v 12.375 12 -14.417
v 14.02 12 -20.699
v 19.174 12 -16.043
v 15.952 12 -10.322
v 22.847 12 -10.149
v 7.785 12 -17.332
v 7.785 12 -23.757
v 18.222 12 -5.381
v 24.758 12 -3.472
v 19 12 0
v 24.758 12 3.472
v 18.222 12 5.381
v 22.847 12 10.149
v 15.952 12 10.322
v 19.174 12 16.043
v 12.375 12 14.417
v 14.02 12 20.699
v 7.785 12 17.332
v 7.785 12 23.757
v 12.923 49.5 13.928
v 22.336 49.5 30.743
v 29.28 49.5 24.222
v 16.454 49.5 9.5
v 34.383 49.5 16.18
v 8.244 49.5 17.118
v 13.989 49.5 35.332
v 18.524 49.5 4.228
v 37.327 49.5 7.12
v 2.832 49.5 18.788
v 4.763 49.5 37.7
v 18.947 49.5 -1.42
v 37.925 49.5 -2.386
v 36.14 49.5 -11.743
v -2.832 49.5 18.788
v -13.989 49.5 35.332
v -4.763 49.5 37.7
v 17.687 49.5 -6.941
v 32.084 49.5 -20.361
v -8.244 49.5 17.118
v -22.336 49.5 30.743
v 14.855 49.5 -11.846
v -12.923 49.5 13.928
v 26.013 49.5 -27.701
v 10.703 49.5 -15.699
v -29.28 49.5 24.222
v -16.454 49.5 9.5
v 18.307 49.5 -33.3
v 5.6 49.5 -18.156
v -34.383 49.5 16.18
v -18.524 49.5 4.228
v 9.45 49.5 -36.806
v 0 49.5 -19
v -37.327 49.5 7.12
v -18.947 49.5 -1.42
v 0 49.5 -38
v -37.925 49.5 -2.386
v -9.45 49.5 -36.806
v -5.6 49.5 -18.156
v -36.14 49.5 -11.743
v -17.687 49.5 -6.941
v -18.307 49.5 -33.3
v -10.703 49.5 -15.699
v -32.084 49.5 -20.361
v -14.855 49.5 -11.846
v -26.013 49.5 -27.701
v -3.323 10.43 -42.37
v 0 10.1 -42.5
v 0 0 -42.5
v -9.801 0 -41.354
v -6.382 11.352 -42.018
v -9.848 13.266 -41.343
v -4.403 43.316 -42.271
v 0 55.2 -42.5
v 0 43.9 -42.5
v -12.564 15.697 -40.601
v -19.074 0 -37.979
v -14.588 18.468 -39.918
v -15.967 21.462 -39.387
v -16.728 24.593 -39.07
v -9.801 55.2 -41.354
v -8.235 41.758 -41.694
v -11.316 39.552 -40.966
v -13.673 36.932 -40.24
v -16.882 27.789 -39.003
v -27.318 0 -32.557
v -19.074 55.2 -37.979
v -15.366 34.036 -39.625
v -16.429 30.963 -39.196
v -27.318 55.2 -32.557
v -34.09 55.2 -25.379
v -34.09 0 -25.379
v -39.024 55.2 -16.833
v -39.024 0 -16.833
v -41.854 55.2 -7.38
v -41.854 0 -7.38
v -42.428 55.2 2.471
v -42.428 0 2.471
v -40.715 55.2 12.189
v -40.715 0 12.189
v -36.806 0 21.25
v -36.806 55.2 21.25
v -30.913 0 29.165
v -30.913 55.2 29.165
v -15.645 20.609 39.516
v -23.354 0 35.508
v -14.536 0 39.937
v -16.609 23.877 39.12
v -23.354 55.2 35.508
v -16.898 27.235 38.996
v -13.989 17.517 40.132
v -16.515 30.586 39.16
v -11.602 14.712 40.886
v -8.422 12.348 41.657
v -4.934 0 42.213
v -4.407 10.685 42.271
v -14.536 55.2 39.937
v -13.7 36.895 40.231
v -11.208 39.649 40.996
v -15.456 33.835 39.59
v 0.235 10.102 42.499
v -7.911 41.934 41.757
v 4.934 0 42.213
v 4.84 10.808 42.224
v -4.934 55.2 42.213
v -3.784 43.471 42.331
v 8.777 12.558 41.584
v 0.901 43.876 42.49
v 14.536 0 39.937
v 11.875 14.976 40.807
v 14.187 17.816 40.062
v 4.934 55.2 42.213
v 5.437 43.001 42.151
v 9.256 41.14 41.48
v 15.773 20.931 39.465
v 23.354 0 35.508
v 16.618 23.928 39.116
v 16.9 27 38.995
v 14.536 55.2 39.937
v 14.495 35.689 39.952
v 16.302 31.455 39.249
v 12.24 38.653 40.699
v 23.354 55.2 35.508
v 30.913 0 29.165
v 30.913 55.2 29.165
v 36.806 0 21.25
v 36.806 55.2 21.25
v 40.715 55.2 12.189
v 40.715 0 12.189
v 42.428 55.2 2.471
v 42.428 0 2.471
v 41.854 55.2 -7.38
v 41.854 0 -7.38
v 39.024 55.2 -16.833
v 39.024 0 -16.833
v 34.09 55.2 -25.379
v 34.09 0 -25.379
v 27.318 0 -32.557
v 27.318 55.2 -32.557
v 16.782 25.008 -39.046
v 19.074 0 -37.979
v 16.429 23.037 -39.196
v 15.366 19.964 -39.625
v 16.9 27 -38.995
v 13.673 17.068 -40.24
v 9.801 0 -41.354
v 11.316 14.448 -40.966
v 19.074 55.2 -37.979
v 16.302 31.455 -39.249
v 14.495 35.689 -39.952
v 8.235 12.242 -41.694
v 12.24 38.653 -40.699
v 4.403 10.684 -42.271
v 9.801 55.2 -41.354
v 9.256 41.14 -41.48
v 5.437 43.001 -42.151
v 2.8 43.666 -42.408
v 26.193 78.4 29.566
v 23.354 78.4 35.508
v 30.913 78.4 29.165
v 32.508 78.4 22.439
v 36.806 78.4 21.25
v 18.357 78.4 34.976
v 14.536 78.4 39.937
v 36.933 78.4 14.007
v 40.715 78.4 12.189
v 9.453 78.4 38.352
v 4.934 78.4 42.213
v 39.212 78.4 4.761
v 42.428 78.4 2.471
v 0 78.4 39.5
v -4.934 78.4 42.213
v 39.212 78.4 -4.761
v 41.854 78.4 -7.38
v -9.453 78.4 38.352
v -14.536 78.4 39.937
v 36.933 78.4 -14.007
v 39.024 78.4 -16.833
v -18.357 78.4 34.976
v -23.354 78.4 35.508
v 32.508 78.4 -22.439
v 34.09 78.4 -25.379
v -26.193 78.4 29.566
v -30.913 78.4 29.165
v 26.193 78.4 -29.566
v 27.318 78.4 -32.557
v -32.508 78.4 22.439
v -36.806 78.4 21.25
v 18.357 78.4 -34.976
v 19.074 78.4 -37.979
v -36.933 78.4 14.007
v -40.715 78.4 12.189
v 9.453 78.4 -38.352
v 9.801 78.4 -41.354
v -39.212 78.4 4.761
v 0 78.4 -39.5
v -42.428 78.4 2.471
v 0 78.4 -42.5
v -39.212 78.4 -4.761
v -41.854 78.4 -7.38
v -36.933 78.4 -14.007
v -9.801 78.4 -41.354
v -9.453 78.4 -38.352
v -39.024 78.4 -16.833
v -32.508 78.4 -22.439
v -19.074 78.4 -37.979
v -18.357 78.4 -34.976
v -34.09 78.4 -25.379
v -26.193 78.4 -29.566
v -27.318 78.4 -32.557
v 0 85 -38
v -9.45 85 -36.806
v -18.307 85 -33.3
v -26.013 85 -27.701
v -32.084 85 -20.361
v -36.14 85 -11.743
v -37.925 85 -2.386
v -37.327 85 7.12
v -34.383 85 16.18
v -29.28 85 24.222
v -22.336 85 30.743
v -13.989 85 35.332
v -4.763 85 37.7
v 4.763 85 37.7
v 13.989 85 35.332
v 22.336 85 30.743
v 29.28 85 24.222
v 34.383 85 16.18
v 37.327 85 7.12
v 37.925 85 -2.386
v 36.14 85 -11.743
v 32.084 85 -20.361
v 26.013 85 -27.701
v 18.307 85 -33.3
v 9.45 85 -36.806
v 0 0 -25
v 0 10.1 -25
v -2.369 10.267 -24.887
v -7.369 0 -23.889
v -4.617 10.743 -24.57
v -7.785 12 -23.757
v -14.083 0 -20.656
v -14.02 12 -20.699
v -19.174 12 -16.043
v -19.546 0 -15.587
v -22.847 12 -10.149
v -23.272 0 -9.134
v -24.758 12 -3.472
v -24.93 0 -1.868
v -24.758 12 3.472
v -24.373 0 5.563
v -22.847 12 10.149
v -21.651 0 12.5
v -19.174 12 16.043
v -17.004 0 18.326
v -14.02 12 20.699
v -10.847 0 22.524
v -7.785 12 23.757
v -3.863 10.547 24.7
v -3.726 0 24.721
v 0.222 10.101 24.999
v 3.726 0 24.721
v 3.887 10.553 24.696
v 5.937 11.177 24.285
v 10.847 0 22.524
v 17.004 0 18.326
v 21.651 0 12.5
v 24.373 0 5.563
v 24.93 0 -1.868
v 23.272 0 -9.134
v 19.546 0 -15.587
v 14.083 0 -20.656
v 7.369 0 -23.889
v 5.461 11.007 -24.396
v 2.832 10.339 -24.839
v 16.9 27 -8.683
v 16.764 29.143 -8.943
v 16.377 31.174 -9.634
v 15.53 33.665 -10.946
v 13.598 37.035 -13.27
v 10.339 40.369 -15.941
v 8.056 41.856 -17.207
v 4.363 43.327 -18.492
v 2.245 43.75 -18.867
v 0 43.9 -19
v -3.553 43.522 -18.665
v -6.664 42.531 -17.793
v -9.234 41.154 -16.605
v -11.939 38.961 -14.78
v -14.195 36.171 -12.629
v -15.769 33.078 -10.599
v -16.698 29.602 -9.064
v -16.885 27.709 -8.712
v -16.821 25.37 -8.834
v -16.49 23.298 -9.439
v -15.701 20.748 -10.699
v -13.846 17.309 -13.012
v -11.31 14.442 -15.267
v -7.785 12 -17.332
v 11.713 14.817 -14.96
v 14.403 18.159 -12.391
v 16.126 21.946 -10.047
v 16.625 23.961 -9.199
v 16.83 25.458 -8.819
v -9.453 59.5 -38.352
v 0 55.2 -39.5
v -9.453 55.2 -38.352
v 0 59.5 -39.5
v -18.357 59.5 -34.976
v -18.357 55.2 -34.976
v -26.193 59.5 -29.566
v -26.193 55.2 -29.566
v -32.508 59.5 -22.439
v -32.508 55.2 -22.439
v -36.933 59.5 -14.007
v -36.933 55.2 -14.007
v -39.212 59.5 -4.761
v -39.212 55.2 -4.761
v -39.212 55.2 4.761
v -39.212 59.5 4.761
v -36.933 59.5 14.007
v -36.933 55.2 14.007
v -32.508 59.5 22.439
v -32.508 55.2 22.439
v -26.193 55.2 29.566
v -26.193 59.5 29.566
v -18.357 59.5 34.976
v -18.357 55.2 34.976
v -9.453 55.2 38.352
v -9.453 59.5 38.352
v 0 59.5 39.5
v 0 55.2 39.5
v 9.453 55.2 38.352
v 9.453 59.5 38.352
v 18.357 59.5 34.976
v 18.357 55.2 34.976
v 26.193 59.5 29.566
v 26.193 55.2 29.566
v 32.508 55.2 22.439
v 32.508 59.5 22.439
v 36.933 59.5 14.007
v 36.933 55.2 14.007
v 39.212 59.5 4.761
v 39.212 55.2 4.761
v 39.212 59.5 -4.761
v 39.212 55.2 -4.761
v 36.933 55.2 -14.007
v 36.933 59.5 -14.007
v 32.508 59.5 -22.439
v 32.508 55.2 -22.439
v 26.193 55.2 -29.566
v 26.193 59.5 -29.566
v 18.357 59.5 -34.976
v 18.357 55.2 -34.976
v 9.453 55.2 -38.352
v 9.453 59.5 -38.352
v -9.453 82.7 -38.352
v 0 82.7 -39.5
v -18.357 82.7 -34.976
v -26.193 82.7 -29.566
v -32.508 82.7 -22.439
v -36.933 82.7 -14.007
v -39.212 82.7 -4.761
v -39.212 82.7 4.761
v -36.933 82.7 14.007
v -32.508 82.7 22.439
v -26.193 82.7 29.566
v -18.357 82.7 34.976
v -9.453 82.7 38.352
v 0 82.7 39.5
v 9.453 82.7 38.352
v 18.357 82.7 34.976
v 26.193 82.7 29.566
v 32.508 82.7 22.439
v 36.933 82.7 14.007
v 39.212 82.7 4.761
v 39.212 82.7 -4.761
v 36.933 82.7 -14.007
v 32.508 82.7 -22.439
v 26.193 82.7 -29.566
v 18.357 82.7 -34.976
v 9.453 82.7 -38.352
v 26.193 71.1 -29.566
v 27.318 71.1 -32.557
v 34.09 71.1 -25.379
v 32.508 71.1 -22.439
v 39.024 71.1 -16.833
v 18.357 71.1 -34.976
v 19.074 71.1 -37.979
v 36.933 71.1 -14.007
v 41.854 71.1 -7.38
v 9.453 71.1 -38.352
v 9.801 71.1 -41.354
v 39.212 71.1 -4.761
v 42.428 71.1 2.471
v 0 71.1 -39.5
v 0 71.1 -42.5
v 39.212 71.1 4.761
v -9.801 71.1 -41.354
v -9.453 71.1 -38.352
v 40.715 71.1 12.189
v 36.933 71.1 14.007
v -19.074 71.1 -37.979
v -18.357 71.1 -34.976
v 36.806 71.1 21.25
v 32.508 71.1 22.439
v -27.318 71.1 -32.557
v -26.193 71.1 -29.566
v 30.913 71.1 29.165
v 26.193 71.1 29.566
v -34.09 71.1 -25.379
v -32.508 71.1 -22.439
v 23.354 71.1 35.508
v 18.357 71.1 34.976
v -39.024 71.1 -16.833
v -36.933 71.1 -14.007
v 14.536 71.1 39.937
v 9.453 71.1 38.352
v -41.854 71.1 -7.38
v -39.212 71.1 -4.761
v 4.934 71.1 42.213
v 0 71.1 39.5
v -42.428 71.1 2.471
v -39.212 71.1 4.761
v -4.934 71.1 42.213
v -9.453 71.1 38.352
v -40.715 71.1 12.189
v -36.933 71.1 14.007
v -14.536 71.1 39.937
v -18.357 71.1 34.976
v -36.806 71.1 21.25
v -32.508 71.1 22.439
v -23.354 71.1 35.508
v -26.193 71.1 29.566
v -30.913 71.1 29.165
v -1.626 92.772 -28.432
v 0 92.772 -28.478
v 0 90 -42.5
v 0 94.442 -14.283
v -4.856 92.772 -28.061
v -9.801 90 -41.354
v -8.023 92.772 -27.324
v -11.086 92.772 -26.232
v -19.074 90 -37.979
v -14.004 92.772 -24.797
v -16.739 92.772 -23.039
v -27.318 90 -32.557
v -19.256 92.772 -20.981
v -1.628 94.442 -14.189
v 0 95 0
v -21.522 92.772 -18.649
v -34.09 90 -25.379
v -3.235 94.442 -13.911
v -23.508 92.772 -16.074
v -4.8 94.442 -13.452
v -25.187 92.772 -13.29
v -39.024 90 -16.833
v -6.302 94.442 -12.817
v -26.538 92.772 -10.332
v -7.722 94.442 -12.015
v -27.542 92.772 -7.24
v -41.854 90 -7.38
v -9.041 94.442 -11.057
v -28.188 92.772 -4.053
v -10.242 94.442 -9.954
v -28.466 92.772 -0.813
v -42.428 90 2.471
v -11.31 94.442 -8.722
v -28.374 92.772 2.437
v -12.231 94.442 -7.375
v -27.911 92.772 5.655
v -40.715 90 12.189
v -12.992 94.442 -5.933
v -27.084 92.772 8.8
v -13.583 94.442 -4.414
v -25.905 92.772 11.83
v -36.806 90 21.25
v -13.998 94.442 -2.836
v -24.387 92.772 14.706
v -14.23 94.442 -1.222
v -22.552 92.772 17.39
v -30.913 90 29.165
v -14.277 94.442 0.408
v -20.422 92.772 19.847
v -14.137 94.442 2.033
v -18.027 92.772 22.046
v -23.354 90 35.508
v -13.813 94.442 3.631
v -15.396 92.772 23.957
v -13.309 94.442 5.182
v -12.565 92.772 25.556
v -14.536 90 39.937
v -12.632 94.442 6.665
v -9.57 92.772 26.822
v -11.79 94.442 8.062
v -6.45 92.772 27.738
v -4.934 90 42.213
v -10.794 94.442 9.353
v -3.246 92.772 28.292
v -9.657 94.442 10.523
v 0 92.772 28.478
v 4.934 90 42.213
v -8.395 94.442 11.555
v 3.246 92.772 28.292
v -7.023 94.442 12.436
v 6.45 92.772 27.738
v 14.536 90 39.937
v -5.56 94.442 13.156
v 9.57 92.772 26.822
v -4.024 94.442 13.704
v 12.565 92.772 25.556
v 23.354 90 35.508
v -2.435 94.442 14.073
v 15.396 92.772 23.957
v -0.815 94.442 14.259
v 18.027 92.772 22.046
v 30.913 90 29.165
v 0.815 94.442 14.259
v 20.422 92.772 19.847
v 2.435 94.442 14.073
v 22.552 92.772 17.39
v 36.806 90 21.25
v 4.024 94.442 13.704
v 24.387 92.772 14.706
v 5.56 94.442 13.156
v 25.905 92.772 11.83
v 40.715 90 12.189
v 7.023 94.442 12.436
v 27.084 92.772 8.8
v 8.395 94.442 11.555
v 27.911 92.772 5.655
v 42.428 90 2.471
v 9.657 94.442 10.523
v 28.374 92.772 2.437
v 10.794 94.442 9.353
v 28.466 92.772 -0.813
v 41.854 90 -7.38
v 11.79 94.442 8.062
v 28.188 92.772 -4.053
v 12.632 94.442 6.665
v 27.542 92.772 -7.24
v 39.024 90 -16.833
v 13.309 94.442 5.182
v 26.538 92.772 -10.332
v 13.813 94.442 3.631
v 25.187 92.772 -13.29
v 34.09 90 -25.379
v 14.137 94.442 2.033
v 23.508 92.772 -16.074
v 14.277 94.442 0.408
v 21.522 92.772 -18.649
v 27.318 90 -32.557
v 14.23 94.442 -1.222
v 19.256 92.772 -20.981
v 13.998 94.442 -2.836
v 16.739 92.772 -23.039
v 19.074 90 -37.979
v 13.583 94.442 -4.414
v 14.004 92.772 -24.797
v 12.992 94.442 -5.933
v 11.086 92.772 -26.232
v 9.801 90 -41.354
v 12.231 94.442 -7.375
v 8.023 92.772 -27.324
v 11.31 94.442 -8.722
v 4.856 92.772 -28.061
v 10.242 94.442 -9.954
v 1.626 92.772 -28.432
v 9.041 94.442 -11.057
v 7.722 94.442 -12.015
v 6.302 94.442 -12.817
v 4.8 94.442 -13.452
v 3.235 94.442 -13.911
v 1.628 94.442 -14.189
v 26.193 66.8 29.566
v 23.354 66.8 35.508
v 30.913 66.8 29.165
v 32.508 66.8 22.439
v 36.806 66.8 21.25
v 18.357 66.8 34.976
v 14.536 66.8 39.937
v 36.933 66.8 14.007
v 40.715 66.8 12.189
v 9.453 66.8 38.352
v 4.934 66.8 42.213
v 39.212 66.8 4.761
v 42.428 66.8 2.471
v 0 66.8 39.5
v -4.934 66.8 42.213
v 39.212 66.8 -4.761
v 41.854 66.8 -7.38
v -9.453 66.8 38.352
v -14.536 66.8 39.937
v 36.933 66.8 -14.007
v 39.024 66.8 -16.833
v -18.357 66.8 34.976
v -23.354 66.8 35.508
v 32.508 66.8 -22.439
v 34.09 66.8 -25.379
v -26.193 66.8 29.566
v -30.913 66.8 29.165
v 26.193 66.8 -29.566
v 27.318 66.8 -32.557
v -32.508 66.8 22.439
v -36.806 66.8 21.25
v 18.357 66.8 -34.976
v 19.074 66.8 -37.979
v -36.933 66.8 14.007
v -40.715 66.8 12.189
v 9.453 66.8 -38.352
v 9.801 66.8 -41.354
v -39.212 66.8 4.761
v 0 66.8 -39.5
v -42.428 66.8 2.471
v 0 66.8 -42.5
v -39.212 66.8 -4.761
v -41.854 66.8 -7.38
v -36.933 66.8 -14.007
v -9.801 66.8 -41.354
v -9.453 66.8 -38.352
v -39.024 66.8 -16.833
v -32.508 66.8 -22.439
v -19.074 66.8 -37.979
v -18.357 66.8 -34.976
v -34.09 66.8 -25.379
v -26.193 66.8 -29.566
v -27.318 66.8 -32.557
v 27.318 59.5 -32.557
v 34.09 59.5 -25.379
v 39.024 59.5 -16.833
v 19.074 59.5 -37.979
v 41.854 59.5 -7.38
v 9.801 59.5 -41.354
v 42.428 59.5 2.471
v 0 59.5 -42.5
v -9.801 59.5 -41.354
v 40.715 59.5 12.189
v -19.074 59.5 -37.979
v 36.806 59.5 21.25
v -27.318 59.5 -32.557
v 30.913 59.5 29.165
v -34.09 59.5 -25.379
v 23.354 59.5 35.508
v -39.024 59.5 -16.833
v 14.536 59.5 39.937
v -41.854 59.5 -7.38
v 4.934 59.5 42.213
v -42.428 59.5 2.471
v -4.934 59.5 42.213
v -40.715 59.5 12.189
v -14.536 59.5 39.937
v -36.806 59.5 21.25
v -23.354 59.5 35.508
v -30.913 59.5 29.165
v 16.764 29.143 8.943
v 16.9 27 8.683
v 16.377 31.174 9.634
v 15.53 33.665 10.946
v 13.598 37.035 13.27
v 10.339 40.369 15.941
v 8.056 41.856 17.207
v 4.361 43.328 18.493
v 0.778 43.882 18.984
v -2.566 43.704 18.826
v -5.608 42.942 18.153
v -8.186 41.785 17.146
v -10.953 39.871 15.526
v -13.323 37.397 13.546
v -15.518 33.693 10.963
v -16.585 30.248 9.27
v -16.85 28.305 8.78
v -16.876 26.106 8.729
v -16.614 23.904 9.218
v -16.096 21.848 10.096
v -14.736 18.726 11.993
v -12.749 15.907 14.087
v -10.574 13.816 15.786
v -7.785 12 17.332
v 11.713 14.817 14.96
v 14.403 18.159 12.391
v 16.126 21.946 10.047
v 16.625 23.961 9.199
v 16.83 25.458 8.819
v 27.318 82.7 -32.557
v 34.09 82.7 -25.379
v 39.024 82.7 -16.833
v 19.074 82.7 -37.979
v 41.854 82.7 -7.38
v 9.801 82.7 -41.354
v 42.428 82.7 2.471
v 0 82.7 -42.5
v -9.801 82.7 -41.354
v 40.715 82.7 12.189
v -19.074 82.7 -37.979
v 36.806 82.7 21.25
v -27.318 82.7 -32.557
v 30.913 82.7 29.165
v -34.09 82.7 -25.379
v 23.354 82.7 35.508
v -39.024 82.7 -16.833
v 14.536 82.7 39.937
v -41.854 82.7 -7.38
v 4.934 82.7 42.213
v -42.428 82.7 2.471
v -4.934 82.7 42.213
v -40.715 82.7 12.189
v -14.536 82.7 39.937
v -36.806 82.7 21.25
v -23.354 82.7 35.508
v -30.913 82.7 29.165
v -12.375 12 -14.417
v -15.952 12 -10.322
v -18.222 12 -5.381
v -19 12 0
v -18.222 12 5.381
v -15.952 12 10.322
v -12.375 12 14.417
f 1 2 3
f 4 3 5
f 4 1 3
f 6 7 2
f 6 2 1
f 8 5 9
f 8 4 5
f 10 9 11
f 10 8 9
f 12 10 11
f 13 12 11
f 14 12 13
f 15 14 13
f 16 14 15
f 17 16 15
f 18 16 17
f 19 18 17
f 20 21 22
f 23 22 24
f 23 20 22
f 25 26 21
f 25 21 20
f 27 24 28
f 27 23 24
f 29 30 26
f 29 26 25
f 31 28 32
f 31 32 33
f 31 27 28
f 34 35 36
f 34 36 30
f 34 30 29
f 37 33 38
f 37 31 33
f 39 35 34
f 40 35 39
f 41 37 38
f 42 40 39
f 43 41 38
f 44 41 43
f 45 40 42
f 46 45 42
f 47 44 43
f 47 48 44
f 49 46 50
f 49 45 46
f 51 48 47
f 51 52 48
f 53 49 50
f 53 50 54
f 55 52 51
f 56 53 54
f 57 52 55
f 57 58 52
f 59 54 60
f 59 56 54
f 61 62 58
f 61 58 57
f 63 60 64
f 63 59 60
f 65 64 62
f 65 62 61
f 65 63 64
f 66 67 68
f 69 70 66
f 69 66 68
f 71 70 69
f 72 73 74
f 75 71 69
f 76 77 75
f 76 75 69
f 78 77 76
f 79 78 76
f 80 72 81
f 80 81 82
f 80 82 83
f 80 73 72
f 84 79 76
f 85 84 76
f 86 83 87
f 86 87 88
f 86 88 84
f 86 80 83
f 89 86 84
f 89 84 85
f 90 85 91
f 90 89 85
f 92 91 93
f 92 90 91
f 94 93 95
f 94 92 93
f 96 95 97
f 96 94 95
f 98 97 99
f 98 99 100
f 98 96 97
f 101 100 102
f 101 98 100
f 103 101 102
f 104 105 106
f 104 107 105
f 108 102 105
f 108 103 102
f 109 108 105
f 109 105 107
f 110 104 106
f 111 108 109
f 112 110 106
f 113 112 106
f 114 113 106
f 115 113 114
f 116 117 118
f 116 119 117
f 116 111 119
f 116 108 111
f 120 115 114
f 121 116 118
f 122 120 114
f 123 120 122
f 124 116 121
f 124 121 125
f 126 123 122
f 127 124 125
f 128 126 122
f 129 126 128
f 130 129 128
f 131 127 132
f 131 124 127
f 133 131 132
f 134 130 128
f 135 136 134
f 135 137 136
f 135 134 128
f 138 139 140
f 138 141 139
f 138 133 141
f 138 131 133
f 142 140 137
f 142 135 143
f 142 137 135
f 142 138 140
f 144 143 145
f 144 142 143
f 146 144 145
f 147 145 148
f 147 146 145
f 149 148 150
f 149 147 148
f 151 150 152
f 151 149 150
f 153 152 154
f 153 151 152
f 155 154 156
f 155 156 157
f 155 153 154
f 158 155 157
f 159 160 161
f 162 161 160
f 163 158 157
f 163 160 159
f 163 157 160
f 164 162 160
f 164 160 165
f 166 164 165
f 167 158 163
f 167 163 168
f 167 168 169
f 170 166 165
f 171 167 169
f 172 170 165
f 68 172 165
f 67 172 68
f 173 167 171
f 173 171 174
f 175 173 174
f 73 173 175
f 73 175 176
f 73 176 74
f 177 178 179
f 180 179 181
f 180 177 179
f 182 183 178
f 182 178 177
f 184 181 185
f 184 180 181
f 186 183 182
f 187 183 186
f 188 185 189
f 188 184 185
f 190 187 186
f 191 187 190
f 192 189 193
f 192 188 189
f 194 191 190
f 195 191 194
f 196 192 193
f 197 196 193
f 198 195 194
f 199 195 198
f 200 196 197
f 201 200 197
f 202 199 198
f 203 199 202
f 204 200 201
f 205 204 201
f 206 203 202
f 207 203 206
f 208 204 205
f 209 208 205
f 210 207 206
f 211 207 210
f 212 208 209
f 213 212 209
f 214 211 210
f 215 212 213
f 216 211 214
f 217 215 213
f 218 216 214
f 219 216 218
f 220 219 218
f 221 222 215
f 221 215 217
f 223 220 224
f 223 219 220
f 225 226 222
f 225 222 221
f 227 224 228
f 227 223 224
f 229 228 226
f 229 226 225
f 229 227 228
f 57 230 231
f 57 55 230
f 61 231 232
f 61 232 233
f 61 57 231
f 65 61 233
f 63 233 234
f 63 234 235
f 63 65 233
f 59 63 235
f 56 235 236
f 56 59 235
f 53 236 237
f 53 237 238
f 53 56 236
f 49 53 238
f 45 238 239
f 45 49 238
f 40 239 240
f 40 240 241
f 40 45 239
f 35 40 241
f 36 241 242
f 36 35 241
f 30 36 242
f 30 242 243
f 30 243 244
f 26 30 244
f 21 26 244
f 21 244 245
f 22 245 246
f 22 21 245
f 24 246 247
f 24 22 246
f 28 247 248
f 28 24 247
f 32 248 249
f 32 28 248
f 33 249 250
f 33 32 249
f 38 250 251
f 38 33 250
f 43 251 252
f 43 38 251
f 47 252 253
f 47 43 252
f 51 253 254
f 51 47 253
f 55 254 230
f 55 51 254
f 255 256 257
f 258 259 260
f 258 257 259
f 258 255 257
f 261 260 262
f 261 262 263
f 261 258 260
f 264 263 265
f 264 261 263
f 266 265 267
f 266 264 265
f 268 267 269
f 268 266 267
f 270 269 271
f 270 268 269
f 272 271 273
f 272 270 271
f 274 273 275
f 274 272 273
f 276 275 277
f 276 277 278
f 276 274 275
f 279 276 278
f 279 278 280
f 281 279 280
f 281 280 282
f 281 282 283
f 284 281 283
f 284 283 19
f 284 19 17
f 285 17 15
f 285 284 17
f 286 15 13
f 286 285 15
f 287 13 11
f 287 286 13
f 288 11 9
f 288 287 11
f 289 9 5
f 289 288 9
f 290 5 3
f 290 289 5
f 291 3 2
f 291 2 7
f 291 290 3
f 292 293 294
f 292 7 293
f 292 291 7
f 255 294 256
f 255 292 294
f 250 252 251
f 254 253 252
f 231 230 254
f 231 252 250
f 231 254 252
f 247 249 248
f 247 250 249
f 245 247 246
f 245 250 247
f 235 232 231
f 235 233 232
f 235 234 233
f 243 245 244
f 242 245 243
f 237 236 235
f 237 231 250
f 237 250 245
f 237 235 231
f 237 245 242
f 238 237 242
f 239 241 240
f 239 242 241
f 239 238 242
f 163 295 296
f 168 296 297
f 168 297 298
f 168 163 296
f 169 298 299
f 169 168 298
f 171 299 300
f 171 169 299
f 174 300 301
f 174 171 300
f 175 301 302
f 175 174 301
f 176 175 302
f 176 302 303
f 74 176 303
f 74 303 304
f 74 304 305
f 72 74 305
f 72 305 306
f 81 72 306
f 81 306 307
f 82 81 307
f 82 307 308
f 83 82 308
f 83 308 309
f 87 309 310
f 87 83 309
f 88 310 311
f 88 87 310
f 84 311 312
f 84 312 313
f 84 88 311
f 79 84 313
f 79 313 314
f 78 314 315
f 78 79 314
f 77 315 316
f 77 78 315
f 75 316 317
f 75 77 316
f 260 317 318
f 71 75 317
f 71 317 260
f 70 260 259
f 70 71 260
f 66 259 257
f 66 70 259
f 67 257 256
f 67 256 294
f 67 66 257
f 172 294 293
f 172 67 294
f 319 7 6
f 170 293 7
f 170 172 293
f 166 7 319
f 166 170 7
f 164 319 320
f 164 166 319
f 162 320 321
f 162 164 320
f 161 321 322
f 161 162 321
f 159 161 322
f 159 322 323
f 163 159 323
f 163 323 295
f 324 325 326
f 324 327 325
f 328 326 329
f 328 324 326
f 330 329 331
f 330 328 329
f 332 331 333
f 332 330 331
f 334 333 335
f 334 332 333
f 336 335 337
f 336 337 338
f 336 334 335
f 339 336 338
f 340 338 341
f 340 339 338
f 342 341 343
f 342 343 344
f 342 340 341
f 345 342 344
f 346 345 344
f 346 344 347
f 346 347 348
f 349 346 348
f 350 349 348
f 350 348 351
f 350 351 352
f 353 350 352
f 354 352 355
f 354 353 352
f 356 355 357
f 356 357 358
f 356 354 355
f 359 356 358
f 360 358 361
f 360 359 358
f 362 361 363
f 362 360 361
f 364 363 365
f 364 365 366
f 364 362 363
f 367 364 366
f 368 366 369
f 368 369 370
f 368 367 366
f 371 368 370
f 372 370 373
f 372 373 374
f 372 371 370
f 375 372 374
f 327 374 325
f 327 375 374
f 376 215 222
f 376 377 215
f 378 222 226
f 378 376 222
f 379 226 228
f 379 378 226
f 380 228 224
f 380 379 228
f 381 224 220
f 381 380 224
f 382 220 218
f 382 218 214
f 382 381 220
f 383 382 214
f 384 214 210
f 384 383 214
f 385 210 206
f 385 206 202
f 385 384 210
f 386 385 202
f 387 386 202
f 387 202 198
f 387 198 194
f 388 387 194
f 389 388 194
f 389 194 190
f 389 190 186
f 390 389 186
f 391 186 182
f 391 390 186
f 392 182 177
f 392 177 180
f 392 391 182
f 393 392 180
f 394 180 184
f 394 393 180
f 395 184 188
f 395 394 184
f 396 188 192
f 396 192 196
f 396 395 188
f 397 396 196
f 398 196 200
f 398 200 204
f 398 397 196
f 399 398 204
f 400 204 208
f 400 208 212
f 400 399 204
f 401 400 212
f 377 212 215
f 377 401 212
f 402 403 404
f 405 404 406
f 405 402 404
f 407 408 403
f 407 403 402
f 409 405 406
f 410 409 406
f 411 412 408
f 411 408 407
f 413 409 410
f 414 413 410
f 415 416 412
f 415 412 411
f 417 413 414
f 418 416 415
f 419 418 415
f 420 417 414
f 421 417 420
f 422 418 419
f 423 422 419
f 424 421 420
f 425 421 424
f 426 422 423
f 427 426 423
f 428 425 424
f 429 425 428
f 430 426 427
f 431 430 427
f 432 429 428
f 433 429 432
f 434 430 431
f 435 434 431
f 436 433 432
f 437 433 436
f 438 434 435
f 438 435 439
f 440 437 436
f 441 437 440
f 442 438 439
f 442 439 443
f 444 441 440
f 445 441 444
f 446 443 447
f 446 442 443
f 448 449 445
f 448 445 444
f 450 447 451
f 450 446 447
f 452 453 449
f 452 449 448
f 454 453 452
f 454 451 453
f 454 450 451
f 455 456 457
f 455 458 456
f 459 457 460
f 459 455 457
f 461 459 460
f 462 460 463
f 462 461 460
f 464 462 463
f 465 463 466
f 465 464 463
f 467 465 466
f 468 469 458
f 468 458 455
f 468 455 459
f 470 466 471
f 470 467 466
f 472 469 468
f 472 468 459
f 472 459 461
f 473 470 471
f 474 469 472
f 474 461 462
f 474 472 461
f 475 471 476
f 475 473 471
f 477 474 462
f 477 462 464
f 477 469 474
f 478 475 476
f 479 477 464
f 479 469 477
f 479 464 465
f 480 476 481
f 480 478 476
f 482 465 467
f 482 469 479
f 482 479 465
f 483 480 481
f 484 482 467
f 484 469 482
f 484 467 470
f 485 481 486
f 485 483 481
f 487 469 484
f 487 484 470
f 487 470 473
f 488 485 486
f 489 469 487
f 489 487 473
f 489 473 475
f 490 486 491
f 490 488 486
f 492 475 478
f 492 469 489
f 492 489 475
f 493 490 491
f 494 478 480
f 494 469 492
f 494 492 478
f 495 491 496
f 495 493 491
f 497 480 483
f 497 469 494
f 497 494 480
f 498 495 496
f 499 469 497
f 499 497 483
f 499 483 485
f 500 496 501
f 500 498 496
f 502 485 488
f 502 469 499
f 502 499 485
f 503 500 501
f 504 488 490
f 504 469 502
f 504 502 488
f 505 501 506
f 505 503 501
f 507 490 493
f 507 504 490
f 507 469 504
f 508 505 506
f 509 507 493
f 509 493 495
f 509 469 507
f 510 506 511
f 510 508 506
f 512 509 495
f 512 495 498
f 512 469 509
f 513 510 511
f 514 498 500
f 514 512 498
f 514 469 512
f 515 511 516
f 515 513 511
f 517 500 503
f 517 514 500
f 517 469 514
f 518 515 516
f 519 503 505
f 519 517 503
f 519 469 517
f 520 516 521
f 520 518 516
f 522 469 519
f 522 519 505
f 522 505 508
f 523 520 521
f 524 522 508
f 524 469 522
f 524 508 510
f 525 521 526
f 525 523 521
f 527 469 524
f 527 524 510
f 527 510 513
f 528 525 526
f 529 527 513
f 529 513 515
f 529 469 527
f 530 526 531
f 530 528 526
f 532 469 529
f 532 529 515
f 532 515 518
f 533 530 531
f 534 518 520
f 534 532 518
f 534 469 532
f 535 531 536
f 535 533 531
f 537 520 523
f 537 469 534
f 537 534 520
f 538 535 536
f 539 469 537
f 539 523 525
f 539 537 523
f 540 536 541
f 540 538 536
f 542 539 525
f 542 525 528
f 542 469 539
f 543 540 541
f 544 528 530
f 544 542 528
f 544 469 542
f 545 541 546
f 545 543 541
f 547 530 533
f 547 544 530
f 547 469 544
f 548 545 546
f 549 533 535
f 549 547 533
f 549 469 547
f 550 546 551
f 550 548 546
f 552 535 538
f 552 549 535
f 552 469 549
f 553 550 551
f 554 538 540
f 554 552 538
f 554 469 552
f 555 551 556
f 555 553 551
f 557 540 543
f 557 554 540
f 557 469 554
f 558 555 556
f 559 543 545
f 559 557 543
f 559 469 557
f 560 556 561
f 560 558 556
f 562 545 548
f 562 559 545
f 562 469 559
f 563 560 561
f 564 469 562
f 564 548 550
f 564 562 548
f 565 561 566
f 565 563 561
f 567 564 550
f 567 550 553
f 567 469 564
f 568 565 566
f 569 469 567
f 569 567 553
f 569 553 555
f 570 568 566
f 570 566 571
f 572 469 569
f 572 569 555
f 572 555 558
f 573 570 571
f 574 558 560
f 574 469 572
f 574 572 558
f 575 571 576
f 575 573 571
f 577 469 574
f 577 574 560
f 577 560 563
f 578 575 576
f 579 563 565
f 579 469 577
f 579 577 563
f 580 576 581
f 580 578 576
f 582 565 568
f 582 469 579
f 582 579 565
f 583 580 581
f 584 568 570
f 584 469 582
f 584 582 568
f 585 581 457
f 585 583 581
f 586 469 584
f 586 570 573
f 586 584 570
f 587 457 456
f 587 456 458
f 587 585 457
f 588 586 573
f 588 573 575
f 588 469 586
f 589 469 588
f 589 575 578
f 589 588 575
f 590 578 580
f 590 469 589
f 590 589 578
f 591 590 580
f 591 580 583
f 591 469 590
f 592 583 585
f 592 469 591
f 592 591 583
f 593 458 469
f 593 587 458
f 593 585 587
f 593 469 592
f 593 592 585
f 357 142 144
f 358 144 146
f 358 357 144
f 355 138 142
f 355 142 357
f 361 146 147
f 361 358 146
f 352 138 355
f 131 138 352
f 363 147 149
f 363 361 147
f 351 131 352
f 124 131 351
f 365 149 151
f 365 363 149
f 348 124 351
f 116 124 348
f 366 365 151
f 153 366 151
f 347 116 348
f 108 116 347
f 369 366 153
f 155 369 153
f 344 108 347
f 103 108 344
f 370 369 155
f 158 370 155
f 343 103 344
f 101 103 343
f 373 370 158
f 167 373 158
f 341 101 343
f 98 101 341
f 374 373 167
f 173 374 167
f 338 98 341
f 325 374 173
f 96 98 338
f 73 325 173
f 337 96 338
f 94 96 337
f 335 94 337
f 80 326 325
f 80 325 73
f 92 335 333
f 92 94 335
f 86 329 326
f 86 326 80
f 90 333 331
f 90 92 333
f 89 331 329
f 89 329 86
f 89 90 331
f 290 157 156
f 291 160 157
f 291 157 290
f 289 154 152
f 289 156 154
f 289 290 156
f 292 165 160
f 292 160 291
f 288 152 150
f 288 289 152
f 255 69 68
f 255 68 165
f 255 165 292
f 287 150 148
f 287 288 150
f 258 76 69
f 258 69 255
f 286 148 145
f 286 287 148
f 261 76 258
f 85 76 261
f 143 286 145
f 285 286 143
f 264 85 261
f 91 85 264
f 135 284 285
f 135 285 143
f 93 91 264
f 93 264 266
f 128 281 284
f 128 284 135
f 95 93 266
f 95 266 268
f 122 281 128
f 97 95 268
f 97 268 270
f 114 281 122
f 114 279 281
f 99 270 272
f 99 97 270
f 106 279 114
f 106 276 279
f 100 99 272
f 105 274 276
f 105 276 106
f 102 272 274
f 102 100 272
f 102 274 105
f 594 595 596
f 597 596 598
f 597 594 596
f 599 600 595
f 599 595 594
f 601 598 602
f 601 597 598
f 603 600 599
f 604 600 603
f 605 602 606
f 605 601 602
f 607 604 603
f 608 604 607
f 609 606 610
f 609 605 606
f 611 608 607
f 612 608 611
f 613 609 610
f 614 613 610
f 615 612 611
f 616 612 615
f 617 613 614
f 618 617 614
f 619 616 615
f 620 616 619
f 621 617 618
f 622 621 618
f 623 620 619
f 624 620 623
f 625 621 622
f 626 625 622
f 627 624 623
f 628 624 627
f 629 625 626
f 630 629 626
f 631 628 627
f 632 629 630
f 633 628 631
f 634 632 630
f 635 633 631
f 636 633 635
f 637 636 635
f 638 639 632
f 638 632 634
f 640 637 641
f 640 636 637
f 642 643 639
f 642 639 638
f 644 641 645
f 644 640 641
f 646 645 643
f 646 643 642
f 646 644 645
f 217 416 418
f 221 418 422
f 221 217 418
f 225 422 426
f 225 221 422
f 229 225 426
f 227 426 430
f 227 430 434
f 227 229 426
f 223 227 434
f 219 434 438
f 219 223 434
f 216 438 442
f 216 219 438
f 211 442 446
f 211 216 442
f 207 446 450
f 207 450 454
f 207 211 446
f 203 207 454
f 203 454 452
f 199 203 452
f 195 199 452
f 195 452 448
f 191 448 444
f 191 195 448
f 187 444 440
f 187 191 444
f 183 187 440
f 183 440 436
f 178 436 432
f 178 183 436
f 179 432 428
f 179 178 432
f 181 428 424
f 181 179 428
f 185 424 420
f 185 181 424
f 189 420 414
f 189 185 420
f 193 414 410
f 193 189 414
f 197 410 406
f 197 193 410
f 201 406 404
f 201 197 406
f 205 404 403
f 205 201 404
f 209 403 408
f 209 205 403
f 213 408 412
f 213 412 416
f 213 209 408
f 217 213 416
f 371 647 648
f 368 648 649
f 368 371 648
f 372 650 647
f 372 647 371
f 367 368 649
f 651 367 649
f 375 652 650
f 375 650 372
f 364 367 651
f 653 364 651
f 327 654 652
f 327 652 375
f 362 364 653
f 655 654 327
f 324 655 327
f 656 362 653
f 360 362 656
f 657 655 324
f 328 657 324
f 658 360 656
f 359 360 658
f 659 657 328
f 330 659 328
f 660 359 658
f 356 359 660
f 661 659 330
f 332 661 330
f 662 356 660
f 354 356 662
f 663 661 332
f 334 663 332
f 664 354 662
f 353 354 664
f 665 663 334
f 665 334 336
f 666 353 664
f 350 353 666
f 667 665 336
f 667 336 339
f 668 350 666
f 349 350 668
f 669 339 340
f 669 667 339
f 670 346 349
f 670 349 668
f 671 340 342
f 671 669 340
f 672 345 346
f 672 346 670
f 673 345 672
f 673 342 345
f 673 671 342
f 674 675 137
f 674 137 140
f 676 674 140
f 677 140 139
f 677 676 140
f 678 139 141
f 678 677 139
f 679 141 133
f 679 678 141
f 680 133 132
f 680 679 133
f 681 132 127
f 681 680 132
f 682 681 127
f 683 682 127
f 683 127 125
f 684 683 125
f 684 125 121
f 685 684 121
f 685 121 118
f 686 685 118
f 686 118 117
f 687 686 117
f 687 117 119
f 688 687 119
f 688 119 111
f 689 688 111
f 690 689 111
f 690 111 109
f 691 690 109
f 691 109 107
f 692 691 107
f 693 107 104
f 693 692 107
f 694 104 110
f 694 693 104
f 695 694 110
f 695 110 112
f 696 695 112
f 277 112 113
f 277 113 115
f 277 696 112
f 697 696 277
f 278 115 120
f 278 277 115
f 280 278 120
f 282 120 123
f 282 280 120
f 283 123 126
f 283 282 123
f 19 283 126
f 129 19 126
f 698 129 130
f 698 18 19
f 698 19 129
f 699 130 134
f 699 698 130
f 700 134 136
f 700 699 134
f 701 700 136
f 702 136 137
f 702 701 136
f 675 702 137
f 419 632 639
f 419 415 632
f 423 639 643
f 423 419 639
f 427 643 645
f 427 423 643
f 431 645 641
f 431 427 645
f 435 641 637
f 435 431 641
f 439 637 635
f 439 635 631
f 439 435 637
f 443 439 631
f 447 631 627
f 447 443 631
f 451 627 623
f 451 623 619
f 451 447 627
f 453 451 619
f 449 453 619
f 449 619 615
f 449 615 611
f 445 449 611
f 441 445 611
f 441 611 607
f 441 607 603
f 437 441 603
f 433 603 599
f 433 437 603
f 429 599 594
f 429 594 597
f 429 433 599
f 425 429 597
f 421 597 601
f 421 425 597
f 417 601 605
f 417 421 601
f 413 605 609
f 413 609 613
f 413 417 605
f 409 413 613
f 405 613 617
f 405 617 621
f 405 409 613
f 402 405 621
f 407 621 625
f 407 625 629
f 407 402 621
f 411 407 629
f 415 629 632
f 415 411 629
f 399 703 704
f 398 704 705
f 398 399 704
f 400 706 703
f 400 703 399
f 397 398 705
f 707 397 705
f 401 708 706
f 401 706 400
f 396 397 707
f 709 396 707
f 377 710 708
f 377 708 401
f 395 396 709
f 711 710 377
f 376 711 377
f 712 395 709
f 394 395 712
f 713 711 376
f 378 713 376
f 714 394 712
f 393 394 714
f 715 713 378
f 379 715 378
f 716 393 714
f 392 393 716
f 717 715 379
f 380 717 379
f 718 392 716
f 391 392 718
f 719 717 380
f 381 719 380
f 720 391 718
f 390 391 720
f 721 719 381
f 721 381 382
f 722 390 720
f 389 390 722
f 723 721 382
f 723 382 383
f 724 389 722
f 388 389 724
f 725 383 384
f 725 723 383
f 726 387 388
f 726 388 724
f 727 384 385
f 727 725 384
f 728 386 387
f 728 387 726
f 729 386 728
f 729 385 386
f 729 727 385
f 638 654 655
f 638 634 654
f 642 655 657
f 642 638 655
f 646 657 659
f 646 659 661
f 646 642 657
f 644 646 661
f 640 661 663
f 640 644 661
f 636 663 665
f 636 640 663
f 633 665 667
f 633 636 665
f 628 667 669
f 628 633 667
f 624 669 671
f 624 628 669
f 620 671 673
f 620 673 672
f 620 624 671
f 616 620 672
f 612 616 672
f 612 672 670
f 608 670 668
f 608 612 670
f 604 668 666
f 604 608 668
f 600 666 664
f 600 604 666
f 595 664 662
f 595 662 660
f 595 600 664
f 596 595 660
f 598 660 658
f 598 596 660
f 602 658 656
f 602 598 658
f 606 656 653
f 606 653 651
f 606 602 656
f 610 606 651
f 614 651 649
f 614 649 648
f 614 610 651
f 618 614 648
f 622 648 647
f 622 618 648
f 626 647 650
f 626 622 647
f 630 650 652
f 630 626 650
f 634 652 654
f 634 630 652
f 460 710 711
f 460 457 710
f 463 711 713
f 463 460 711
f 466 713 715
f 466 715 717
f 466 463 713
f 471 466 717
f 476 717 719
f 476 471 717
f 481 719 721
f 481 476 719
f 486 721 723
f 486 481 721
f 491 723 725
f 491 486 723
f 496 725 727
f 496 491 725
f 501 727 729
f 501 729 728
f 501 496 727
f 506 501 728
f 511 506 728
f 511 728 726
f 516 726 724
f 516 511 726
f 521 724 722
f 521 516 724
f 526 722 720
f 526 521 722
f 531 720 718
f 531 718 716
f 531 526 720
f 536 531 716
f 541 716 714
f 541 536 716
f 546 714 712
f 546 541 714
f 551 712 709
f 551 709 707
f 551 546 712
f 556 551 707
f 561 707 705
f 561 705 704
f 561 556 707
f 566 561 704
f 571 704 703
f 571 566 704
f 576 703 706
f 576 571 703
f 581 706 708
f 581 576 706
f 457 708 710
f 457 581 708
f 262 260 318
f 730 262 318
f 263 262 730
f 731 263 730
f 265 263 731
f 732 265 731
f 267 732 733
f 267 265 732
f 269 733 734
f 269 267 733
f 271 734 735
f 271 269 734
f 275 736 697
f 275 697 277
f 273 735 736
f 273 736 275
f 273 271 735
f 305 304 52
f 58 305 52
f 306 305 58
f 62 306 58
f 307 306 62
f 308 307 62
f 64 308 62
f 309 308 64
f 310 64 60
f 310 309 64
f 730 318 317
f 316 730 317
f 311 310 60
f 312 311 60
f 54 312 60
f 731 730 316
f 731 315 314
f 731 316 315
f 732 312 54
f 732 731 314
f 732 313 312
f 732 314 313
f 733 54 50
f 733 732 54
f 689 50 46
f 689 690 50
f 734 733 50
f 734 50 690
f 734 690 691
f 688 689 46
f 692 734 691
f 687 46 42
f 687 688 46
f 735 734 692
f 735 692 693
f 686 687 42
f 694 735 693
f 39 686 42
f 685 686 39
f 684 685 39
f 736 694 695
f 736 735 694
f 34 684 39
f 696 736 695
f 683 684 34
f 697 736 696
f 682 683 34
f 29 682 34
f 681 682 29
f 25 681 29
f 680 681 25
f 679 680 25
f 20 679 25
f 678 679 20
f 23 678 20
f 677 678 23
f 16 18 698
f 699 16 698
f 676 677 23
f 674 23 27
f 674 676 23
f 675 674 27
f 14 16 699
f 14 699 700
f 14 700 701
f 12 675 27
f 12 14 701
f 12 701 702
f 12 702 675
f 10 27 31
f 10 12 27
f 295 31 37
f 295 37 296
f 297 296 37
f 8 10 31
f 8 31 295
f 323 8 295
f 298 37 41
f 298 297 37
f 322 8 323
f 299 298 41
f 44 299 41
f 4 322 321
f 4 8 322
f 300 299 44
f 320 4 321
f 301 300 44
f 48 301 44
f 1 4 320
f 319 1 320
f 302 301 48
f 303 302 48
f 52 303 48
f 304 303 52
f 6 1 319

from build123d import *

# Parameters (mm, degrees)
CUT_EXTRUDE1_DEPTH      = 113.41663578
CUT_EXTRUDE1_DEPTH_BACK = 113.41663578
SKETCH6_R               = 16.9


with BuildPart() as part:
    # Sketch5 → Revolve1 (revolve)
    with BuildSketch(Plane.XY, mode=Mode.PRIVATE) as revolve1_sk:
        with BuildLine():
            Line((25, 0), (42.5, 0))
            Line((42.5, 0), (42.5, 55.2))
            Line((42.5, 55.2), (39.5, 55.2))
            Line((39.5, 55.2), (39.5, 59.5))
            Line((39.5, 59.5), (42.5, 59.5))
            Line((42.5, 59.5), (42.5, 66.8))
            Line((42.5, 66.8), (39.5, 66.8))
            Line((39.5, 66.8), (39.5, 71.1))
            Line((39.5, 71.1), (42.5, 71.1))
            Line((42.5, 71.1), (42.5, 78.4))
            Line((42.5, 78.4), (39.5, 78.4))
            Line((39.5, 78.4), (39.5, 82.7))
            Line((39.5, 82.7), (42.5, 82.7))
            Line((42.5, 82.7), (42.5, 90))
            ThreePointArc((42.5, 90), (21.396553461, 93.745704417), (0, 95))
            Line((0, 95), (0, 90))
            Line((0, 90), (0, 85))
            Line((0, 85), (38, 85))
            Line((38, 85), (38, 49.5))
            Line((38, 49.5), (19, 49.5))
            Line((19, 49.5), (19, 12))
            Line((19, 12), (25, 12))
            Line((25, 12), (25, 0))
        make_face()
    revolve(revolve1_sk.sketch.rotate(Axis((0, 0, 0), (0, 1, 0)), 90), axis=Axis((0, 0, 0), (0, 1, 0)))

    # Sketch6 → Cut-Extrude1 (cut, two sides: drawn at the far end of the back side and taken through both)
    with BuildSketch(Plane.XY.offset(-CUT_EXTRUDE1_DEPTH_BACK)):
        with Locations((0, 27)):
            Circle(SKETCH6_R)
    extrude(amount=CUT_EXTRUDE1_DEPTH + CUT_EXTRUDE1_DEPTH_BACK, mode=Mode.SUBTRACT)


solid = part.part
